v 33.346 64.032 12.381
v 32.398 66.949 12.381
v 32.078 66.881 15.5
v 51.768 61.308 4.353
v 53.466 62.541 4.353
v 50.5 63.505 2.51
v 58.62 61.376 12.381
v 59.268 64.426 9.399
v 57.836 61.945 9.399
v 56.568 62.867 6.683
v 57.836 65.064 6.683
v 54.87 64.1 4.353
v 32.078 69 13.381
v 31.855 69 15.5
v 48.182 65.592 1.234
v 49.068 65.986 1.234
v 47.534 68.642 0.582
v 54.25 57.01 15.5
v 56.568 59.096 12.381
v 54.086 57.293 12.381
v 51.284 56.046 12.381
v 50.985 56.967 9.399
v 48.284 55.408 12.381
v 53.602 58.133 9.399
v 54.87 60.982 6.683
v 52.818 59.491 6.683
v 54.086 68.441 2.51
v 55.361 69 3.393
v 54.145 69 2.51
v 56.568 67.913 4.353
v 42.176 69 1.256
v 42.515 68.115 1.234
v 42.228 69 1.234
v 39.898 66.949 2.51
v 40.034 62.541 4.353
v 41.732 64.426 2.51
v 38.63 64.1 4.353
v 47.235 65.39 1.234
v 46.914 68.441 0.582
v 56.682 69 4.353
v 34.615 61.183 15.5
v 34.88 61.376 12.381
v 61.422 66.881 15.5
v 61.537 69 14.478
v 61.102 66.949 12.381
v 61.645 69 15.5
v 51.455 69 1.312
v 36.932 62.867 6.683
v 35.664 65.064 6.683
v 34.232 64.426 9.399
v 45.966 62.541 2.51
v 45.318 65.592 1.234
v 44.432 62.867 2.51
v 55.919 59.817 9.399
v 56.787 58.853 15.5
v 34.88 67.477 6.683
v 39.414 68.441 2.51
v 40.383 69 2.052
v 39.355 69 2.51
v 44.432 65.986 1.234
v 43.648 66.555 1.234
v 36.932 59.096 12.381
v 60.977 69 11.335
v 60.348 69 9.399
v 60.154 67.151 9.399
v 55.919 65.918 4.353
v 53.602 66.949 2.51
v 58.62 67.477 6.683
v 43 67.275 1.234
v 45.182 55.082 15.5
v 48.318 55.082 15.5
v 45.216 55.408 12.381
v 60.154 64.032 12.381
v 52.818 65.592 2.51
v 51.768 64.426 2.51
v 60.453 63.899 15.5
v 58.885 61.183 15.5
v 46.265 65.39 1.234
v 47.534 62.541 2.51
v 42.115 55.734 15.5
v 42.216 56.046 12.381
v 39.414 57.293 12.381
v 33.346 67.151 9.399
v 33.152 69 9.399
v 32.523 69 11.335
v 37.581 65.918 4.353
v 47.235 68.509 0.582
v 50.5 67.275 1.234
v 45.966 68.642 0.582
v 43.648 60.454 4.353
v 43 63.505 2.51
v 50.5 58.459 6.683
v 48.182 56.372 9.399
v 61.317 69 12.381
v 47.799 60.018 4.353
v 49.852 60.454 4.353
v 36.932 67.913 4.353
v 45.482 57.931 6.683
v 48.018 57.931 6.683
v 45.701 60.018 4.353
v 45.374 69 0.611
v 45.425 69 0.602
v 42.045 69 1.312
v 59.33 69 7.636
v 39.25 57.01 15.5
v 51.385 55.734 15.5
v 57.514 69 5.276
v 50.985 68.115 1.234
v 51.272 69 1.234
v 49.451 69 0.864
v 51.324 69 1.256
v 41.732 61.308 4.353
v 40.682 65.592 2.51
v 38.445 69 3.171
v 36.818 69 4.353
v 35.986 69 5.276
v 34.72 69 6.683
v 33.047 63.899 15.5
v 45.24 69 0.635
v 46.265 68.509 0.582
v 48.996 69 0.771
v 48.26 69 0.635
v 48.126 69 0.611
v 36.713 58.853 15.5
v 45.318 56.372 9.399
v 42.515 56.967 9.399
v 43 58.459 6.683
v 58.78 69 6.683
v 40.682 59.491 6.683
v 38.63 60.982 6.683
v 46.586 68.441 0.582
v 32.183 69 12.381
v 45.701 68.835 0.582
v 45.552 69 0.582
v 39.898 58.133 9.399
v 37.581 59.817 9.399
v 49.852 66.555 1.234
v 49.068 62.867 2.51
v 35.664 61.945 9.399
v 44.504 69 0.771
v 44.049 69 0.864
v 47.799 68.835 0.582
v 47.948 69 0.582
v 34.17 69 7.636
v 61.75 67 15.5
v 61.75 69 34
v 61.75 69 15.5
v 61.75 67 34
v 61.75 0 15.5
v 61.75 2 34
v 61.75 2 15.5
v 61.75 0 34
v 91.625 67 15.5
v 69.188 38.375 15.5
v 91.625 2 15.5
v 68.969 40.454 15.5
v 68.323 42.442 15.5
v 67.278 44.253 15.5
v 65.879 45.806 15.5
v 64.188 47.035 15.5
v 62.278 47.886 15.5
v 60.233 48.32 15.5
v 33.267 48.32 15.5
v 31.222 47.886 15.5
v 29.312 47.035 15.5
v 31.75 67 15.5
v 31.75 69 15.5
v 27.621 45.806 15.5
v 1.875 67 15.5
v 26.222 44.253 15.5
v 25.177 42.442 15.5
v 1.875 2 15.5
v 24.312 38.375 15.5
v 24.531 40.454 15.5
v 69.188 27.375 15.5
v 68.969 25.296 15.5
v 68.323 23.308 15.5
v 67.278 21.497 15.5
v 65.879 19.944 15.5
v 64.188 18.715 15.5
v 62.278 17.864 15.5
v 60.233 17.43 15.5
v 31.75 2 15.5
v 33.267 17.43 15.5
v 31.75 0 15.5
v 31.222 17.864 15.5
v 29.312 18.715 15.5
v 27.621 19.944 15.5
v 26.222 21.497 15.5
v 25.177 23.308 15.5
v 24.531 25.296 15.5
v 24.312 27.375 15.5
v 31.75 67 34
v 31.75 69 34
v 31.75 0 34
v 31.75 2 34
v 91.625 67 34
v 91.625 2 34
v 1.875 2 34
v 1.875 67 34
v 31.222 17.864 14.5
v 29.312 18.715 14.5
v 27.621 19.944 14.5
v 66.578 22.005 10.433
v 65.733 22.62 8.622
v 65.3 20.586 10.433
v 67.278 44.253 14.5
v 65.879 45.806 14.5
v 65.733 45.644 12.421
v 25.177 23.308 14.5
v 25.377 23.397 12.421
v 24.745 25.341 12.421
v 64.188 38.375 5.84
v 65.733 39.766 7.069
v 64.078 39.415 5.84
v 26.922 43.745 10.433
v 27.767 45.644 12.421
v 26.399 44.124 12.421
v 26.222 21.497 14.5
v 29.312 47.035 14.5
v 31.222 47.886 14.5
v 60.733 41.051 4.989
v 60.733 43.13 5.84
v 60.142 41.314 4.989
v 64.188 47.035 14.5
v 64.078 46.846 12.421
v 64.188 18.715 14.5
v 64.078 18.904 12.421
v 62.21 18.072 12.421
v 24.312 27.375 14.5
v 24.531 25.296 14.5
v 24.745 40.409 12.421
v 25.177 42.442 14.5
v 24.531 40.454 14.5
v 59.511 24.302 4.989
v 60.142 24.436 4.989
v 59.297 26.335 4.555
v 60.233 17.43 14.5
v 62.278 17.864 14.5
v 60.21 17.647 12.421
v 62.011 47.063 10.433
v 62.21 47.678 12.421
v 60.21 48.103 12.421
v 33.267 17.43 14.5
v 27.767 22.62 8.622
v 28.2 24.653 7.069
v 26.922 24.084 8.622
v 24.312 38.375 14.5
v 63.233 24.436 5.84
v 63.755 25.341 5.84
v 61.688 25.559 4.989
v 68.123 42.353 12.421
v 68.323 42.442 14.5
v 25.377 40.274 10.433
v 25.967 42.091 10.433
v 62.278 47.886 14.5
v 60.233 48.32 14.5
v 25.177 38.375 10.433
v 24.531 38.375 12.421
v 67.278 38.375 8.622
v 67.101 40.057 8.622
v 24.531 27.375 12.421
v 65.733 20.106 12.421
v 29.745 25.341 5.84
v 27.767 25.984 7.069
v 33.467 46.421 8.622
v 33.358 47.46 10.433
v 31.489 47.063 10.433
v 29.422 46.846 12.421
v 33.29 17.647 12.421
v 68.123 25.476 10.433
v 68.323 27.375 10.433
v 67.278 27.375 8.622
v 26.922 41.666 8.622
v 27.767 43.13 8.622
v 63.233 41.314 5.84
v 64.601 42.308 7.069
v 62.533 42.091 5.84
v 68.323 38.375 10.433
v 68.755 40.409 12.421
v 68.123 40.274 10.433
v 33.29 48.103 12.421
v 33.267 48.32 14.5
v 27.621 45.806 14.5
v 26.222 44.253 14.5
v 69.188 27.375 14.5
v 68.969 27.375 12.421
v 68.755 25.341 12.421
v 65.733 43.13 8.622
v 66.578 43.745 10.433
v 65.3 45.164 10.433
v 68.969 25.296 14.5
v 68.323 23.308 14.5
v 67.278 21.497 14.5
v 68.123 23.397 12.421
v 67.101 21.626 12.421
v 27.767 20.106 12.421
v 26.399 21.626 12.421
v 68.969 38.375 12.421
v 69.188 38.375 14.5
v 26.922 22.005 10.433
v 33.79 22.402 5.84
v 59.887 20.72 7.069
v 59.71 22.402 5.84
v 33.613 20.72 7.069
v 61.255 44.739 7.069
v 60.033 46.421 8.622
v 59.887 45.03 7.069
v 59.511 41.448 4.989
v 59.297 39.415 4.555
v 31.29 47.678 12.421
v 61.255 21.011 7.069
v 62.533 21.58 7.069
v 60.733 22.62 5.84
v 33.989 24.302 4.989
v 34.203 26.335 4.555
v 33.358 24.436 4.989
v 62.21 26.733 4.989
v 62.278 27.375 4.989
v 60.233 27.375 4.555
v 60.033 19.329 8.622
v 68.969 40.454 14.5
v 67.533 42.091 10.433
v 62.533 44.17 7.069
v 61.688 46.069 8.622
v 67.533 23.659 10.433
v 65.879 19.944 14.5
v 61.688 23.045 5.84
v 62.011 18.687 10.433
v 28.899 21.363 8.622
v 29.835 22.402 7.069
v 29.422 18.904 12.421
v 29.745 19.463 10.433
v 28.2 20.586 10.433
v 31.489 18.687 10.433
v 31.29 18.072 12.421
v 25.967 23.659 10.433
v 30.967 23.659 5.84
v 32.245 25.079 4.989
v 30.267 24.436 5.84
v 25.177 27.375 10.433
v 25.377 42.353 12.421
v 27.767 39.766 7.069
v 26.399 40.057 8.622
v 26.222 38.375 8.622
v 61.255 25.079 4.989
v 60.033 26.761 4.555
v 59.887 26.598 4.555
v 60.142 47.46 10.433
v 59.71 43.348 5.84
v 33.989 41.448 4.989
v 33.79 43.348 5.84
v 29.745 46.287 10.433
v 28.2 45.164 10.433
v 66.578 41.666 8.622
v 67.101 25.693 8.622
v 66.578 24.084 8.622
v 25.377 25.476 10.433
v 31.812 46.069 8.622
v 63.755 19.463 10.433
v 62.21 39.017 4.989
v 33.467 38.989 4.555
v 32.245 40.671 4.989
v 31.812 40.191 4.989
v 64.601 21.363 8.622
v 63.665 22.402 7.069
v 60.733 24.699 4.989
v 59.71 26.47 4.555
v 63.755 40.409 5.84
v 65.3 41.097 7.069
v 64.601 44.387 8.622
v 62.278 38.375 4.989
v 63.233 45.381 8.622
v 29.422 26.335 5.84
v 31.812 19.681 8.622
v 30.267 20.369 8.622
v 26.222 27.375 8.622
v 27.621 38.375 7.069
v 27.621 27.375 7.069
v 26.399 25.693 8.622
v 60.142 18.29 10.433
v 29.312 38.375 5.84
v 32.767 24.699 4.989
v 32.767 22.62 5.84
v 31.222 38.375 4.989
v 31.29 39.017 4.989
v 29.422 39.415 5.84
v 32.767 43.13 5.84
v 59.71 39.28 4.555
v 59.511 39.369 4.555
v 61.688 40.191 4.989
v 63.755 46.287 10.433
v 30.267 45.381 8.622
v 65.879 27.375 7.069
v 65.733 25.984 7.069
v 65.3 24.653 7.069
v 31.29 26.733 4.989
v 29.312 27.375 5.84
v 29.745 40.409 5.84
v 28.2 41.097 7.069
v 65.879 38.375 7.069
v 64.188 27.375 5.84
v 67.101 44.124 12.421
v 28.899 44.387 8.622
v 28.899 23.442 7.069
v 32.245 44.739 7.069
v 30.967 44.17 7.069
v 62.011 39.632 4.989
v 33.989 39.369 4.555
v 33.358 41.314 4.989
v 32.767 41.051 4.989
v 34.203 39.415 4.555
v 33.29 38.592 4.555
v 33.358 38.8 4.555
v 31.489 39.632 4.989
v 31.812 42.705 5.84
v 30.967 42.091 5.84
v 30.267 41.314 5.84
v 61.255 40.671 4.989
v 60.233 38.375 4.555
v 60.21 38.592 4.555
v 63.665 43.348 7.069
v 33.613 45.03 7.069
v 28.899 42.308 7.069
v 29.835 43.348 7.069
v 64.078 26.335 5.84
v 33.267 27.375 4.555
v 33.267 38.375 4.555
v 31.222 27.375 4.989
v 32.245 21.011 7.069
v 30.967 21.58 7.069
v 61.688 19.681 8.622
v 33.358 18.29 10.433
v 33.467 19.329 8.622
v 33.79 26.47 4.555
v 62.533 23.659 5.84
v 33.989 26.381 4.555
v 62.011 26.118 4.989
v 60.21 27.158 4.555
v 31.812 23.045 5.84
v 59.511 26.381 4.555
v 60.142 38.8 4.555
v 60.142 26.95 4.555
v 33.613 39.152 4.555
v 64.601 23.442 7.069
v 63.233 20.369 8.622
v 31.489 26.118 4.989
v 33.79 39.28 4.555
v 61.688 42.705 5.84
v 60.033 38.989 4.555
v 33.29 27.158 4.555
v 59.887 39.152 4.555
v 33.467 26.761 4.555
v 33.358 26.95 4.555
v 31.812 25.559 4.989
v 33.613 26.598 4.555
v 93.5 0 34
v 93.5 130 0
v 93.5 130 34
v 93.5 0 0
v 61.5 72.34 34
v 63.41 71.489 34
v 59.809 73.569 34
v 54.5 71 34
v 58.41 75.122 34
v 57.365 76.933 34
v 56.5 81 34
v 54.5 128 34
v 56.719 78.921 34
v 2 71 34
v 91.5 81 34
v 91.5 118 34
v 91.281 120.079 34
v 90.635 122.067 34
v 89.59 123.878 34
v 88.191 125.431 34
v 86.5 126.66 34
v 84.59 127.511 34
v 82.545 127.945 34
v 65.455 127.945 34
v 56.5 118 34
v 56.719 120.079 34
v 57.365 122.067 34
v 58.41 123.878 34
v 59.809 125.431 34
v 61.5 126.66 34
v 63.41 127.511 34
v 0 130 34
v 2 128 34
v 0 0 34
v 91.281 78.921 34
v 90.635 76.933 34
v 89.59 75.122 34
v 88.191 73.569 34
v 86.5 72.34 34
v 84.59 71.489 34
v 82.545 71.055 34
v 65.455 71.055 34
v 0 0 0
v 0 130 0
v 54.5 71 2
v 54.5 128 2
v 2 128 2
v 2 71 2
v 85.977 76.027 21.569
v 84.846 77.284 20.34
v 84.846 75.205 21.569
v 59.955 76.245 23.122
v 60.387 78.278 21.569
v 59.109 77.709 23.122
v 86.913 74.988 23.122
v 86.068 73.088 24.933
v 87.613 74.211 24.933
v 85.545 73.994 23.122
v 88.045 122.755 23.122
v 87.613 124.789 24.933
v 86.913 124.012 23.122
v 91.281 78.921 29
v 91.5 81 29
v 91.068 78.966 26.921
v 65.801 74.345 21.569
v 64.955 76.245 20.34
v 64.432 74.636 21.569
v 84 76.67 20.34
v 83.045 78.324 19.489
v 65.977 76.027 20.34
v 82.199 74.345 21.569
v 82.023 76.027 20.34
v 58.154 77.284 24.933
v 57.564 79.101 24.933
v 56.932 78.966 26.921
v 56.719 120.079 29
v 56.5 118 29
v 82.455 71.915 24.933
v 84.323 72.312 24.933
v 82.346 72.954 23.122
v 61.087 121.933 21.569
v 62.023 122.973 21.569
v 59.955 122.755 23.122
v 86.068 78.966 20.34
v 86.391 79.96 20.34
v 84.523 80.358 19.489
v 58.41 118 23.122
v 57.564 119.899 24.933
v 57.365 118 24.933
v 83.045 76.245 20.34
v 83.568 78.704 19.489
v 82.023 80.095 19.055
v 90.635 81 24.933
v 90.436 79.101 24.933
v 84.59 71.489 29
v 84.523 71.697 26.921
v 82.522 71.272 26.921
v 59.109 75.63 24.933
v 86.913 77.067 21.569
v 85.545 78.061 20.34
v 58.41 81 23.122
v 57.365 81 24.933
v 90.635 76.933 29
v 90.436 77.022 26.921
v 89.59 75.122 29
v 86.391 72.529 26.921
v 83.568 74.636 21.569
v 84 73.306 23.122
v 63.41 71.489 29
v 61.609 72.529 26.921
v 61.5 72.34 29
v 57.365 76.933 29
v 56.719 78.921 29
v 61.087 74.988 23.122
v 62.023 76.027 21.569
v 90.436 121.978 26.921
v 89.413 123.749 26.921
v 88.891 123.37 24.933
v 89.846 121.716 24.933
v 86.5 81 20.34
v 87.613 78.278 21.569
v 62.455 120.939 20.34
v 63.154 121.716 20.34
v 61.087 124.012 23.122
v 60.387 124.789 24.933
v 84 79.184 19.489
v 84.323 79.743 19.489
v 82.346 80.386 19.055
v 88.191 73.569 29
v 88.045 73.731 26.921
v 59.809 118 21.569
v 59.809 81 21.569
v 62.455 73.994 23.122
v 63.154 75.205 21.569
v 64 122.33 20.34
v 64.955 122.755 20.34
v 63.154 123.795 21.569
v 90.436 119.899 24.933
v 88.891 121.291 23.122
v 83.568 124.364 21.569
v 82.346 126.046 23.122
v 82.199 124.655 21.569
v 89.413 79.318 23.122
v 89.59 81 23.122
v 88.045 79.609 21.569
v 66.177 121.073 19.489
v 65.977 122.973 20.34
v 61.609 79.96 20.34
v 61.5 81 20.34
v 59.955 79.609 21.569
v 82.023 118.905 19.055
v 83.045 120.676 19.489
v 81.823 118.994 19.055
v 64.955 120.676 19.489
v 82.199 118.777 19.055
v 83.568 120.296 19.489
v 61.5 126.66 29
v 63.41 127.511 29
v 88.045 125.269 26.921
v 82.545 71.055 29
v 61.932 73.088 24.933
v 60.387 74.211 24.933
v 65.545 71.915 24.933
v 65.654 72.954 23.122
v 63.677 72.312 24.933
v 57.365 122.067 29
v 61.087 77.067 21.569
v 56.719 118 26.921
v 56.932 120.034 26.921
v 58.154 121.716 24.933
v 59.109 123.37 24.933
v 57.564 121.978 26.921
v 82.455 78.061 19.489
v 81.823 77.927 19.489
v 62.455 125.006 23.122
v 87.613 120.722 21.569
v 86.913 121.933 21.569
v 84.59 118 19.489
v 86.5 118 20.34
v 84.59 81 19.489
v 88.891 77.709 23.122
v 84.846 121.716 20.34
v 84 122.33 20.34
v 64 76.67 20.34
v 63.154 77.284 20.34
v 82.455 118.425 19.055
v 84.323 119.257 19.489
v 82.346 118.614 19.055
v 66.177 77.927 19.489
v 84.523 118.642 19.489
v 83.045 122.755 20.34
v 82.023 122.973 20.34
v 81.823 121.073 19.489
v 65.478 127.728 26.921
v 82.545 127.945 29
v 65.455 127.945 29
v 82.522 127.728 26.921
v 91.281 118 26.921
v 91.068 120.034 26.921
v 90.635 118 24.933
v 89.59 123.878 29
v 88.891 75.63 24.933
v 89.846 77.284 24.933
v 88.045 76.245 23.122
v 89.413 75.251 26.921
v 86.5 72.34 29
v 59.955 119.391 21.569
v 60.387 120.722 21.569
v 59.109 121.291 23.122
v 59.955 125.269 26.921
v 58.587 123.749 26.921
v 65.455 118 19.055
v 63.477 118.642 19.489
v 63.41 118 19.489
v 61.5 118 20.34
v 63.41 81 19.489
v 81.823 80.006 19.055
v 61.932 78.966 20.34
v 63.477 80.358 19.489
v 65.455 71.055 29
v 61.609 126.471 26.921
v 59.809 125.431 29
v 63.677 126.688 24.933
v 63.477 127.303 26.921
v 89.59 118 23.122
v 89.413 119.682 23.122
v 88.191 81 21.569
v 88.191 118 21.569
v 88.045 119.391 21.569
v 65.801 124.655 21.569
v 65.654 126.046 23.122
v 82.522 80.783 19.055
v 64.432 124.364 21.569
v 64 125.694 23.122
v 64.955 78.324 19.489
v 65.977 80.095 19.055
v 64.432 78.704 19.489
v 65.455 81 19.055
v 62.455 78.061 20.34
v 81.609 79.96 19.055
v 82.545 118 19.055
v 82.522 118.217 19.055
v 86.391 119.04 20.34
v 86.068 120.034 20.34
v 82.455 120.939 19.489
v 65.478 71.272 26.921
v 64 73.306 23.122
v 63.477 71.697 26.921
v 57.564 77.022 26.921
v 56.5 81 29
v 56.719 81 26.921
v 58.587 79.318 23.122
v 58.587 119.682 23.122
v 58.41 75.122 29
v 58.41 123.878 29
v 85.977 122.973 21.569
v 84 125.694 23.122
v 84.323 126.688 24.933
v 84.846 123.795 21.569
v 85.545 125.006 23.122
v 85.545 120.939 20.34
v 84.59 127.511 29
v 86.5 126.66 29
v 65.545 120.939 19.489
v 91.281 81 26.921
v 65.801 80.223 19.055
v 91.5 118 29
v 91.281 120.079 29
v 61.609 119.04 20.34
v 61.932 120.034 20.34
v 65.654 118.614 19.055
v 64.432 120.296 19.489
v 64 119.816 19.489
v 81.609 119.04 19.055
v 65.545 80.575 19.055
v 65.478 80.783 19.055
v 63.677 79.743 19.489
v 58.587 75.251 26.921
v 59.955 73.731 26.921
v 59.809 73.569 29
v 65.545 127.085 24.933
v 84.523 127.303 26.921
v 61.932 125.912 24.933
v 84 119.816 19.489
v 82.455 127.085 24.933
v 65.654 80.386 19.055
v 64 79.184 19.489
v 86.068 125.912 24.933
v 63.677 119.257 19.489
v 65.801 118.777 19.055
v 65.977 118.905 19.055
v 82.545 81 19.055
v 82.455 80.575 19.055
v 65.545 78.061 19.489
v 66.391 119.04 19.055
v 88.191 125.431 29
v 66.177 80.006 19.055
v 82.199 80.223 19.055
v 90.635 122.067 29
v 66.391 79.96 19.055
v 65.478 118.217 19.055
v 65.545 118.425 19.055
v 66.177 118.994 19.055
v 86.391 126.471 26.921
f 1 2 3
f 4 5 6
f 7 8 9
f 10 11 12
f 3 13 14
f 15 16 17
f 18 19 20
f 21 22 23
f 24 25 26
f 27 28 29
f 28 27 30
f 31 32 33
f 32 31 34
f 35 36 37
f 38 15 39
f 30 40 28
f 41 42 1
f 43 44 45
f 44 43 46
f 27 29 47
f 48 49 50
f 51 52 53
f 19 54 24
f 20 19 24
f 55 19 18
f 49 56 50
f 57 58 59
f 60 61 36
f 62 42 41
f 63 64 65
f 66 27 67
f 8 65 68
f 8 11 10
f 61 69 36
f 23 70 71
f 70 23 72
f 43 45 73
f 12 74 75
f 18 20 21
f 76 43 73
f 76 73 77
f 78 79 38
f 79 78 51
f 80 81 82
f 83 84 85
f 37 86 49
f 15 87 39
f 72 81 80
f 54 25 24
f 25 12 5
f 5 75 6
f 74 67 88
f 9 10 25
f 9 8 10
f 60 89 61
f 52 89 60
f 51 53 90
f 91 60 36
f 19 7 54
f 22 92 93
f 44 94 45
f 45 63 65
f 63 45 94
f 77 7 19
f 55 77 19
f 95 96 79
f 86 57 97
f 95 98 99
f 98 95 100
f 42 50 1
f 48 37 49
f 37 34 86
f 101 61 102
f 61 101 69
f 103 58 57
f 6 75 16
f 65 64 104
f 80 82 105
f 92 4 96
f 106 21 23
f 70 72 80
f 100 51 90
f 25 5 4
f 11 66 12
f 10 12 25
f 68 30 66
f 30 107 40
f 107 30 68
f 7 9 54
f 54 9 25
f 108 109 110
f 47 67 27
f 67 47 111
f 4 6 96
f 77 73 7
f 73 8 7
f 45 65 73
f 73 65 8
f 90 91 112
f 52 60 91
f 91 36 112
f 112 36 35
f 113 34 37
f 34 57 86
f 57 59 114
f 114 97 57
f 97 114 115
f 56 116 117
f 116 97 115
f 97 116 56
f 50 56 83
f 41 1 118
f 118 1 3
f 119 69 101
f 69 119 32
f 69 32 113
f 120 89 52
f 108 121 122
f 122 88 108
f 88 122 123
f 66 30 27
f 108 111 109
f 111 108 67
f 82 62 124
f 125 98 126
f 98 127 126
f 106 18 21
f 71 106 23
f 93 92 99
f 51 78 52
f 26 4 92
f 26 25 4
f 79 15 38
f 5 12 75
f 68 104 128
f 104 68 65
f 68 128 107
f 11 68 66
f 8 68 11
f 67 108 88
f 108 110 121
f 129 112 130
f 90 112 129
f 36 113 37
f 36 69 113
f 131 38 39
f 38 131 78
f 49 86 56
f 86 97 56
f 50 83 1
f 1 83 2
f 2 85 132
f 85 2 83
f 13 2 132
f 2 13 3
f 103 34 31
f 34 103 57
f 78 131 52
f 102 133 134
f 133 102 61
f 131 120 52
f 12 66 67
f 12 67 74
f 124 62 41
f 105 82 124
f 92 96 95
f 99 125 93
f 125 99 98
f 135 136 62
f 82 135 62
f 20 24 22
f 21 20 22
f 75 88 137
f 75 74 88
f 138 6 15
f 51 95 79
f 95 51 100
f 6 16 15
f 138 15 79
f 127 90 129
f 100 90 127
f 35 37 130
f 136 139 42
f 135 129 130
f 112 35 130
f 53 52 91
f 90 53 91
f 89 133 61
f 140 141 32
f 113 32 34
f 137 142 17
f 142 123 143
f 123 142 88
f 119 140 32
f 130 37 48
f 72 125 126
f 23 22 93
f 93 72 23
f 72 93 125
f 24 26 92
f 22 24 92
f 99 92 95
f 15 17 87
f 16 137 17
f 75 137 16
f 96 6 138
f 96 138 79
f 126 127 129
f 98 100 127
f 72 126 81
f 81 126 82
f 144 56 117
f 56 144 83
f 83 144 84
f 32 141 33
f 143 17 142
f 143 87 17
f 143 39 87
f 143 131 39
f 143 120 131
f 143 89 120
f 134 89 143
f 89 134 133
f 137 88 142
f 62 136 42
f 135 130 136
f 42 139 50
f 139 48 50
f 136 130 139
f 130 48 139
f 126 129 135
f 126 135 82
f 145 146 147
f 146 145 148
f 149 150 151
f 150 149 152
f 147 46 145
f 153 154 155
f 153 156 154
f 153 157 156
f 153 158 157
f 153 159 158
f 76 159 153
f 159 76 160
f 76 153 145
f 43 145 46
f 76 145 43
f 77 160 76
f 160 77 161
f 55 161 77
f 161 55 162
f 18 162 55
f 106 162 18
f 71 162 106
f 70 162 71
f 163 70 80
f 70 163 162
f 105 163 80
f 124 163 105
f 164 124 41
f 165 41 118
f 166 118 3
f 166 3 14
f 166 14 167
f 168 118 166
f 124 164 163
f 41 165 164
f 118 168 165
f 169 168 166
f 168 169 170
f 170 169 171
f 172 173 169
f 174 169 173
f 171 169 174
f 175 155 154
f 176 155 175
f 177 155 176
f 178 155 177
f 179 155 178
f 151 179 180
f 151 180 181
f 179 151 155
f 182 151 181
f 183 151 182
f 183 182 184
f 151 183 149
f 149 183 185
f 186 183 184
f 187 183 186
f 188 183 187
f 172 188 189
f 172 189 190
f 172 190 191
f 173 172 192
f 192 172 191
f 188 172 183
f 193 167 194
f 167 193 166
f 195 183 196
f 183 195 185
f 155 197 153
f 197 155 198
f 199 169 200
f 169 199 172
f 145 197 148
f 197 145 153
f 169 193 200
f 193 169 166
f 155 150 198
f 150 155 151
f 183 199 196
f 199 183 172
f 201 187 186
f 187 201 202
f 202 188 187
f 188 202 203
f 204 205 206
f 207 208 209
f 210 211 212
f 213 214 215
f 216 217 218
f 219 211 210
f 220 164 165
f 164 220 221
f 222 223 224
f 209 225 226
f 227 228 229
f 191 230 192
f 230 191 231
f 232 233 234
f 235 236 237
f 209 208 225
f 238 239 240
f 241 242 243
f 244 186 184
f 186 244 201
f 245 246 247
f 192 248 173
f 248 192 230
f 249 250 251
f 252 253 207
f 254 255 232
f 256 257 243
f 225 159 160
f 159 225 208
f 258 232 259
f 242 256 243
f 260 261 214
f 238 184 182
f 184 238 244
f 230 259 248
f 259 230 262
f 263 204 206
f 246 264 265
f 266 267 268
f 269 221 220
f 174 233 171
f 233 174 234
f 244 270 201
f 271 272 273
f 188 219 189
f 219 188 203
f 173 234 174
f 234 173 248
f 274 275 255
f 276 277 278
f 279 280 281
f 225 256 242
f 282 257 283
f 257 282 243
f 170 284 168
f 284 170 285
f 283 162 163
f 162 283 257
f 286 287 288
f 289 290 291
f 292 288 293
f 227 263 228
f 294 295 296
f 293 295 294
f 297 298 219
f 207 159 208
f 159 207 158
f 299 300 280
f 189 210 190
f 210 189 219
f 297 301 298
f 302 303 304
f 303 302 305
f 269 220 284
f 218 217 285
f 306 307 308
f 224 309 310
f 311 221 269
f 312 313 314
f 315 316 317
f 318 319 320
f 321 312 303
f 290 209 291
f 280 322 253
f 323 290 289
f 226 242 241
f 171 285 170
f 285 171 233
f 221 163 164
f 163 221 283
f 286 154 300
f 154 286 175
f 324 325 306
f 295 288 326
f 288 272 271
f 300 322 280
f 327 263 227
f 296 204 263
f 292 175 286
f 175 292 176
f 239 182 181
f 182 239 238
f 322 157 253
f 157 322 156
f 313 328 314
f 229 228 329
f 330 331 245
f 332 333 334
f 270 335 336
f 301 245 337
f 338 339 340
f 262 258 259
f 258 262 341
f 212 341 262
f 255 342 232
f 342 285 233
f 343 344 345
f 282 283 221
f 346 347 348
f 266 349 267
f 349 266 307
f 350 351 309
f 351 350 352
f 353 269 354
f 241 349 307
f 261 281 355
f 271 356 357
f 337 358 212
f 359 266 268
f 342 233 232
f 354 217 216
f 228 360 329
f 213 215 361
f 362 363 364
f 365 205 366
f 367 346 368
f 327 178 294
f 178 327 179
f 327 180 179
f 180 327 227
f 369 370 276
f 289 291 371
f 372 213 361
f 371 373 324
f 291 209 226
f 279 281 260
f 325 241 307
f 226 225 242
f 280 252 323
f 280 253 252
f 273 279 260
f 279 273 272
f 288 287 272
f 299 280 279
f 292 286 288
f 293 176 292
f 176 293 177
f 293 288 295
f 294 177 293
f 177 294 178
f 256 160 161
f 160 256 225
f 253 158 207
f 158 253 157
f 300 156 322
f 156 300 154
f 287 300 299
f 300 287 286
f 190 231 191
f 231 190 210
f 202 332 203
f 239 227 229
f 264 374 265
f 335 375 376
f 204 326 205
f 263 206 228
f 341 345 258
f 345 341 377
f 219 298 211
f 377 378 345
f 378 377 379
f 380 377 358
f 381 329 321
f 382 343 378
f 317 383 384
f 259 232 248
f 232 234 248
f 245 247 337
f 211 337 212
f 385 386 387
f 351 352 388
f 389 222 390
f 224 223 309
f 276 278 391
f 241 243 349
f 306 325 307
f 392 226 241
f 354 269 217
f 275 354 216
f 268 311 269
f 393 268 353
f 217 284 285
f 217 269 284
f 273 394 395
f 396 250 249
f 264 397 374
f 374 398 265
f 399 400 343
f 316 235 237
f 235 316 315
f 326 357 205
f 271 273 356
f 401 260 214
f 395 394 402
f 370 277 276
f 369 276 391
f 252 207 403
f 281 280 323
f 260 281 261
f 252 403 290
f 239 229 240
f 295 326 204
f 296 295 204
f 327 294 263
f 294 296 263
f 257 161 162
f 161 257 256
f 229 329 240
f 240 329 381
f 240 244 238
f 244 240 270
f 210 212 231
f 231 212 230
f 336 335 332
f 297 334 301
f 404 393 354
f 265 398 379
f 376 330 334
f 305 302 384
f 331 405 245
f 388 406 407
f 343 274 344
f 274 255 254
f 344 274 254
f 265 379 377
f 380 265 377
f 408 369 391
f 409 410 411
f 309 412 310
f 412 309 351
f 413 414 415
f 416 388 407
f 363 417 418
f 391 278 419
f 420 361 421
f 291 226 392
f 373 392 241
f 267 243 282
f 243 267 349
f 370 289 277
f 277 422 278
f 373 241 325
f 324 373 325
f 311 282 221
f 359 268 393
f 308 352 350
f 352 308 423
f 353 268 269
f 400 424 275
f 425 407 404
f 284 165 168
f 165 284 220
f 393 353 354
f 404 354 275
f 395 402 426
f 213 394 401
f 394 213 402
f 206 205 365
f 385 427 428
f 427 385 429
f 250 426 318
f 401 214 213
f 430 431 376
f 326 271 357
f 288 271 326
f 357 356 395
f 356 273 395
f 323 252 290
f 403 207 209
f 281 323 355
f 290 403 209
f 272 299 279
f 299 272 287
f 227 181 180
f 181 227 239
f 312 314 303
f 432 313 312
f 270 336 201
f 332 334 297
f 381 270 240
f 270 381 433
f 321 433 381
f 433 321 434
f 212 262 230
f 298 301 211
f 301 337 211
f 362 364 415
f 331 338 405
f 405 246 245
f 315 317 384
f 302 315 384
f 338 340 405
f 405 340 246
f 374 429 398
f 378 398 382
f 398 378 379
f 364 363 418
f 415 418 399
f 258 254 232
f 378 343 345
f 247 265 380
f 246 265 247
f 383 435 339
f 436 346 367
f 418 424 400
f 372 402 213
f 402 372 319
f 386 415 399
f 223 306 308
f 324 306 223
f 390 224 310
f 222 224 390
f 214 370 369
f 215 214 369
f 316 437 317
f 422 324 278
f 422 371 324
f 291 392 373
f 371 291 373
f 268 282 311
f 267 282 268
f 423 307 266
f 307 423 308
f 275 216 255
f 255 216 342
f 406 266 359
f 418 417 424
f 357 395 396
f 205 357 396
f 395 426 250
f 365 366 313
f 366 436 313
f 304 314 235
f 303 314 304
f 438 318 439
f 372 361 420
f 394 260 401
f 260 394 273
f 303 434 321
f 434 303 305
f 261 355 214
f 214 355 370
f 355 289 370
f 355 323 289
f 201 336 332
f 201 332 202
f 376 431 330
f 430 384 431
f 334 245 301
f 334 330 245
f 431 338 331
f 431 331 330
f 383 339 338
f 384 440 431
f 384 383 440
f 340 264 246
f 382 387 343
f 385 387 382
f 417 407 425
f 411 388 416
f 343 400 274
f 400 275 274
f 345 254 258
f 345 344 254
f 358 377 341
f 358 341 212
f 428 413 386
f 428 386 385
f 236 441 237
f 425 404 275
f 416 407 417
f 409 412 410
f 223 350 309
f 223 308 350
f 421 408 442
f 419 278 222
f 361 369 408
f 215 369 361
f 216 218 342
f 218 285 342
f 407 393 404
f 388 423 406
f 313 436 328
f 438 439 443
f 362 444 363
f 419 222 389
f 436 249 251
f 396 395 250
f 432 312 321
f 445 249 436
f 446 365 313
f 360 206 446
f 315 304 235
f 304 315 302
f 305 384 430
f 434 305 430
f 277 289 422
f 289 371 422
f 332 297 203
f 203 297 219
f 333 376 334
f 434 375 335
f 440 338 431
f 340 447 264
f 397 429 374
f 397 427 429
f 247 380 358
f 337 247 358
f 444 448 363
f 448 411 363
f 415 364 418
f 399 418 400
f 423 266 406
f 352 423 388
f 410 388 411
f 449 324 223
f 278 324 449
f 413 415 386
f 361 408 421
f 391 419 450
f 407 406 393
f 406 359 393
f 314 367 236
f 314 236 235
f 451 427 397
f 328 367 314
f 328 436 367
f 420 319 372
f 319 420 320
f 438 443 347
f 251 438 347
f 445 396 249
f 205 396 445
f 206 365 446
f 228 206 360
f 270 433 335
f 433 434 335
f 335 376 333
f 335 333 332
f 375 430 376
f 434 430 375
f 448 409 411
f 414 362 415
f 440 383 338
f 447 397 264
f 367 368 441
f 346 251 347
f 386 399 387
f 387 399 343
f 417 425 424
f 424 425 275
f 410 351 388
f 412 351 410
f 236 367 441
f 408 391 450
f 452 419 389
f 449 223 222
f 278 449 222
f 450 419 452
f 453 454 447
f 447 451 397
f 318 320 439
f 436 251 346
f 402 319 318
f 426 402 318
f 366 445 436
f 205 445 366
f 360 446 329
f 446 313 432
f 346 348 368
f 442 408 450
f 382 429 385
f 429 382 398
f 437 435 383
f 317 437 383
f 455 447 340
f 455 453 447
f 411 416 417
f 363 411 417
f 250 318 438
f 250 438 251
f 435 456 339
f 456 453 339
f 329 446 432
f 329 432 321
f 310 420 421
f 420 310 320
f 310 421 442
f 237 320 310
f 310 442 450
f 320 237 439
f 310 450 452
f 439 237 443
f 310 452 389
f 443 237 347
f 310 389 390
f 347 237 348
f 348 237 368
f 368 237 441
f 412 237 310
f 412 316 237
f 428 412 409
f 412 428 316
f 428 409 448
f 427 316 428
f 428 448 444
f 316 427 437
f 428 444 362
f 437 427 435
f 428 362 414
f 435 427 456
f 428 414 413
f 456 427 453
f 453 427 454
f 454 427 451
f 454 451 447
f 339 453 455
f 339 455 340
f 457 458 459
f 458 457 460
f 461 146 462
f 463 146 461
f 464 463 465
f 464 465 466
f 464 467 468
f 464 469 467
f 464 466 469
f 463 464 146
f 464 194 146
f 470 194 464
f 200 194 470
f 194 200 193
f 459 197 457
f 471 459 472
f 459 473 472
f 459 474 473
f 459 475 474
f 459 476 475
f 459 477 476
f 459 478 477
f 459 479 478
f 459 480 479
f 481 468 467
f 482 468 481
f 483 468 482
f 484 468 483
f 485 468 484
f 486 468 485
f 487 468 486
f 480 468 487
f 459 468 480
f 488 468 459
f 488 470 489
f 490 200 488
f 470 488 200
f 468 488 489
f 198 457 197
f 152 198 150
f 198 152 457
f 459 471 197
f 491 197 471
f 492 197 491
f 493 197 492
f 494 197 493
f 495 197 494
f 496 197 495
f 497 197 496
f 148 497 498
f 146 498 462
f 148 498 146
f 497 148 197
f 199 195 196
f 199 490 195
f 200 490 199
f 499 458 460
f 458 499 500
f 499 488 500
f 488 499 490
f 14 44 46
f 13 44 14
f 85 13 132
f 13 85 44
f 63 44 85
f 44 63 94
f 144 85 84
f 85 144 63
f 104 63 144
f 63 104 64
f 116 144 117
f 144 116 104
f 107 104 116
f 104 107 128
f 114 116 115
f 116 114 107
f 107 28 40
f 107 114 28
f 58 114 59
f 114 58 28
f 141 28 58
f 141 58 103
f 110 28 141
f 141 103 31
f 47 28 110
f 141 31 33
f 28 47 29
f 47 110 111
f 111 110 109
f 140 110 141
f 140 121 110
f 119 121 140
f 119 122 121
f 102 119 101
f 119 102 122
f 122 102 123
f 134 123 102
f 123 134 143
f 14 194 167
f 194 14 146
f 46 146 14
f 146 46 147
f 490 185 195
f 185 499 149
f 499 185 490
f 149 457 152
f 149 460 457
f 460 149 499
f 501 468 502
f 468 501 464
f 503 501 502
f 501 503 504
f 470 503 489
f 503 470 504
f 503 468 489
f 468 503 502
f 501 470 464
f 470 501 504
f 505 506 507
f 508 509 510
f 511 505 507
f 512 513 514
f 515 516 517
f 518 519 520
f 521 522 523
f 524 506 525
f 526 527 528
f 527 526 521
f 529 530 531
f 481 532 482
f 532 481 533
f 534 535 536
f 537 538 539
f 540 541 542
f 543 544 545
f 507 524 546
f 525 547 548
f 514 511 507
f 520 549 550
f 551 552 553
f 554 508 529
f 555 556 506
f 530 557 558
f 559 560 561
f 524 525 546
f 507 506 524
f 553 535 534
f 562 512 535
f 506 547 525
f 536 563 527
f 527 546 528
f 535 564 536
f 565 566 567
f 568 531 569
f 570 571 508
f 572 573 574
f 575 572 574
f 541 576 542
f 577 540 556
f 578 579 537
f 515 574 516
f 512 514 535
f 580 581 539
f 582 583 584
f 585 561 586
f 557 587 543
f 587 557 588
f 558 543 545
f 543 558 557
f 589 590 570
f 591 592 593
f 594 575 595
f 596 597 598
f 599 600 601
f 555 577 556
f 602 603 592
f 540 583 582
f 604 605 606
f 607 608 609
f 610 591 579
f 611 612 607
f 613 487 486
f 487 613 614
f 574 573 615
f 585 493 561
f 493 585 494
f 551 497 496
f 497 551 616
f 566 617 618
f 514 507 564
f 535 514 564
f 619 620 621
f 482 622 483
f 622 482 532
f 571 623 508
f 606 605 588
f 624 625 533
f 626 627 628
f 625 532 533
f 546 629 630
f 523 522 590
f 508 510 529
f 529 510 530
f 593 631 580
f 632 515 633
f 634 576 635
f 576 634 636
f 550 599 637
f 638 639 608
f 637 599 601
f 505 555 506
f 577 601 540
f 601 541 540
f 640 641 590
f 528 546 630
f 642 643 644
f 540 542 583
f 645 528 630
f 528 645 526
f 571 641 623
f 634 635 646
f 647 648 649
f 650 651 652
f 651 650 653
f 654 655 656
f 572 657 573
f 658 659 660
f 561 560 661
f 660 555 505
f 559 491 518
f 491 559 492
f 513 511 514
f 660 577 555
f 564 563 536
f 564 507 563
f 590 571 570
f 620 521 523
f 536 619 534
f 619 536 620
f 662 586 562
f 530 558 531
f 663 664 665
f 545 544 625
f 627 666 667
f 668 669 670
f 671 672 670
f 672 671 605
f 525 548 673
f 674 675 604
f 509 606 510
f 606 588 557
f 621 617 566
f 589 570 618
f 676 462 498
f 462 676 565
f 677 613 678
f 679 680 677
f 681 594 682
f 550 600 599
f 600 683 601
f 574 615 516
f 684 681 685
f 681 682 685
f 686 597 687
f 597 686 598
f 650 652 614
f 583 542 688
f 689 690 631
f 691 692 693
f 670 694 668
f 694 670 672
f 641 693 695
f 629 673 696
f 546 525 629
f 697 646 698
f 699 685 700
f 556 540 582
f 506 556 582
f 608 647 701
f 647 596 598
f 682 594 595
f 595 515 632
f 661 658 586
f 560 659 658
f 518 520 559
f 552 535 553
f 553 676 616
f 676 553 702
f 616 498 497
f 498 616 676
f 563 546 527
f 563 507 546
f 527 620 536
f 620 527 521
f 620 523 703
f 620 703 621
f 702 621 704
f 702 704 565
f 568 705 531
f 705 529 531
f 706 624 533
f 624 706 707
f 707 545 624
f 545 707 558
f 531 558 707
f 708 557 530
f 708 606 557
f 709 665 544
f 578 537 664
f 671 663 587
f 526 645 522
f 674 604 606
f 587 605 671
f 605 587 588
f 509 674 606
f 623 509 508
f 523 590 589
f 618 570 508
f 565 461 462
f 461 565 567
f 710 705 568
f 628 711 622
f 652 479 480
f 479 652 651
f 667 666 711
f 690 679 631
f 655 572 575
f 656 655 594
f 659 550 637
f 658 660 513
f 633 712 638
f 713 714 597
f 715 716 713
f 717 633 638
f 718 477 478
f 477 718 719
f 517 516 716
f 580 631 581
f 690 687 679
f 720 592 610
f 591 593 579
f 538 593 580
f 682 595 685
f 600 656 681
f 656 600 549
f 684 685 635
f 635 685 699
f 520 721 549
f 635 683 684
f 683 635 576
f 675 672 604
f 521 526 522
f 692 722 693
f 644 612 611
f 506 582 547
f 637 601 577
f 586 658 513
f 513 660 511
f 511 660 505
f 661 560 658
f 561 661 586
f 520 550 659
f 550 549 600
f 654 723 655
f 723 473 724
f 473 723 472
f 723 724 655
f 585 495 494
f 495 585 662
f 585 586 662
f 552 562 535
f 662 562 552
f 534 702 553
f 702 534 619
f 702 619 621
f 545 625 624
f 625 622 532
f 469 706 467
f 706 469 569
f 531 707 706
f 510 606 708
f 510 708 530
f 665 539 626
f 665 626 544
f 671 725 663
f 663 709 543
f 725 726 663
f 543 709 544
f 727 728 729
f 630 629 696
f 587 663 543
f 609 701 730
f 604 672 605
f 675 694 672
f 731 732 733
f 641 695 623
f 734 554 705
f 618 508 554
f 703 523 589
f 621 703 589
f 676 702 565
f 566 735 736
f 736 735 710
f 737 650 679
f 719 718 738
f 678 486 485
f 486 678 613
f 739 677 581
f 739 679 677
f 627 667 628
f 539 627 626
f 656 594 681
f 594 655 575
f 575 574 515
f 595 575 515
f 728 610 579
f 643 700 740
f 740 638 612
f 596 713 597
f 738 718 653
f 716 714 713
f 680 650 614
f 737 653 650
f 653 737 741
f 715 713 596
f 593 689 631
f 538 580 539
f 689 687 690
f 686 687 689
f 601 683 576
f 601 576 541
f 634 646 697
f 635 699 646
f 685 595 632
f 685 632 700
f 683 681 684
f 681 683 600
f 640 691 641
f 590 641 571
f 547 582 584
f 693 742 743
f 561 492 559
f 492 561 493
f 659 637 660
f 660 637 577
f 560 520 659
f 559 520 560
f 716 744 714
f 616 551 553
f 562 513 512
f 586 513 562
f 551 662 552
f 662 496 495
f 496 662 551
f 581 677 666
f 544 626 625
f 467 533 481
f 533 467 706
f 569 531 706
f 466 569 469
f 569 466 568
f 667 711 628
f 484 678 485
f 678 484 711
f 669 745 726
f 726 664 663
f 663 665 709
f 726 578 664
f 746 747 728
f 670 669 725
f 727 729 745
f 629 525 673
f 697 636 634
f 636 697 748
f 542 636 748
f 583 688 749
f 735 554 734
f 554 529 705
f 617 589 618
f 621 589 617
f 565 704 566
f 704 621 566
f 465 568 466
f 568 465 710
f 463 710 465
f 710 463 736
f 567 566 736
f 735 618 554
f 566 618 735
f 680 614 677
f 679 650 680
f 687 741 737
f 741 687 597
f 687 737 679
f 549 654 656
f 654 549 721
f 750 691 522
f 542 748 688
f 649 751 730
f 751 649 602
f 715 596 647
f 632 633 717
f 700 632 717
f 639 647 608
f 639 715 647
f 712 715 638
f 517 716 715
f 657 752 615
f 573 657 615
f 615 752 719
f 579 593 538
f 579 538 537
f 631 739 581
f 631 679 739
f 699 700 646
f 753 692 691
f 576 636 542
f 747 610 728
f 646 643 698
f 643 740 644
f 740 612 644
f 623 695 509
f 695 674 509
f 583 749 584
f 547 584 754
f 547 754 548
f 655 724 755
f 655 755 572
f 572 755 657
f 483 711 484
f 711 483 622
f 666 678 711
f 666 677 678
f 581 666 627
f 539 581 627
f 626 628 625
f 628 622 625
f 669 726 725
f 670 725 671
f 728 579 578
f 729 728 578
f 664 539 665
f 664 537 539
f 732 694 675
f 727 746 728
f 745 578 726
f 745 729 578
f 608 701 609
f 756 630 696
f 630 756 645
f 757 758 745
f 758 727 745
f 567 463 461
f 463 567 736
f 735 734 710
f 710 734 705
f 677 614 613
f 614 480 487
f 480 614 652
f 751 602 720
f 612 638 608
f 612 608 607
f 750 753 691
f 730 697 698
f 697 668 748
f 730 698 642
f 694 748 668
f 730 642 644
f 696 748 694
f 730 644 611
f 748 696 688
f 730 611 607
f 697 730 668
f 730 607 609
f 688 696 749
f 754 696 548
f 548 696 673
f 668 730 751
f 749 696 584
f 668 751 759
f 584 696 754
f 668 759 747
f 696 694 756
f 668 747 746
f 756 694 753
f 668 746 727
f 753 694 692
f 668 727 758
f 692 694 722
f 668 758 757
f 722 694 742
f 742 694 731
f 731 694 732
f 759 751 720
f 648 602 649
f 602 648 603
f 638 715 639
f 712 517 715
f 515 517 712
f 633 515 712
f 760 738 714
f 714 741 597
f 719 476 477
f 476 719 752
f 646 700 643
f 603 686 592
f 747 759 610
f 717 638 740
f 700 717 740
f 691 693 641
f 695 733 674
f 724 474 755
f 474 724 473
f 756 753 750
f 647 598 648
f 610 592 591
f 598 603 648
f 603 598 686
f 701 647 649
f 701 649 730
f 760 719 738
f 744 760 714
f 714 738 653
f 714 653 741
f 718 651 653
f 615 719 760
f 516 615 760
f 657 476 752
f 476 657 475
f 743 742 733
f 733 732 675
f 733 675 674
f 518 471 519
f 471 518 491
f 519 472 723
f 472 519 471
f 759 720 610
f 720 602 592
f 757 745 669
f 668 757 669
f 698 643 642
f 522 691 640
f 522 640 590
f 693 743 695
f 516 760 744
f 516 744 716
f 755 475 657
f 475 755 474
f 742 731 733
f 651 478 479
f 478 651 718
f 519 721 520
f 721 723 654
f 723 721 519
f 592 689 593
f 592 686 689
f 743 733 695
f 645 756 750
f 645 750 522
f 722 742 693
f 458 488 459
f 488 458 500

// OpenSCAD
// file: ../roundedcube.scad
// Aquired from https://danielupshaw.com/openscad-rounded-corners/
// License unknown

// Higher definition curves
$fs = 0.01;

module roundedcube(size = [1, 1, 1], center = false, radius = 0.5, apply_to = "all") {
	// If single value, convert to [x, y, z] vector
	size = (size[0] == undef) ? [size, size, size] : size;

	translate_min = radius;
	translate_xmax = size[0] - radius;
	translate_ymax = size[1] - radius;
	translate_zmax = size[2] - radius;

	diameter = radius * 2;

	module build_point(type = "sphere", rotate = [0, 0, 0]) {
		if (type == "sphere") {
			sphere(r = radius);
		} else if (type == "cylinder") {
			rotate(a = rotate)
			cylinder(h = diameter, r = radius, center = true);
		}
	}

	obj_translate = (center == false) ?
		[0, 0, 0] : [
			-(size[0] / 2),
			-(size[1] / 2),
			-(size[2] / 2)
		];

	translate(v = obj_translate) {
		hull() {
			for (translate_x = [translate_min, translate_xmax]) {
				x_at = (translate_x == translate_min) ? "min" : "max";
				for (translate_y = [translate_min, translate_ymax]) {
					y_at = (translate_y == translate_min) ? "min" : "max";
					for (translate_z = [translate_min, translate_zmax]) {
						z_at = (translate_z == translate_min) ? "min" : "max";

						translate(v = [translate_x, translate_y, translate_z])
						if (
							(apply_to == "all") ||
							(apply_to == "xmin" && x_at == "min") || (apply_to == "xmax" && x_at == "max") ||
							(apply_to == "ymin" && y_at == "min") || (apply_to == "ymax" && y_at == "max") ||
							(apply_to == "zmin" && z_at == "min") || (apply_to == "zmax" && z_at == "max")
						) {
							build_point("sphere");
						} else {
							rotate =
								(apply_to == "xmin" || apply_to == "xmax" || apply_to == "x") ? [0, 90, 0] : (
								(apply_to == "ymin" || apply_to == "ymax" || apply_to == "y") ? [90, 90, 0] :
								[0, 0, 0]
							);
							build_point("cylinder", rotate);
						}
					}
				}
			}
		}
	}
}
// file: ../parts.scad
/*This is a module for openscad to be able to output multiple parts
It pairs with a python script that actually managed the multi-output.

https://traverseda.github.io/code/partsScad/index.html
*/
multiPartOutput = false;
multiPartFirstRun = false;
multiPartBuildMode = "default";

module part(partName, c = undef, buildmode="default") {
	if (multiPartFirstRun) {
		echo("Defined new part ---", partName);
		echo("Color ---", partName, c);
	}

	if (buildmode==multiPartBuildMode) {
		if (!multiPartOutput) {
			color(c=c)children();
		}

		if (multiPartOutput == partName) {
			color(c=c)children();
		}
	}
}
// main file
use <../parts.scad>
use <../roundedcube.scad>

THUMB_WIDTH = 30;
WALL_WIDTH = 2;

BOX_HEIGHT = 43.5;
BOX_WIDTH = 93.5;
BOX_DEPTH = 130;

CARD_HEIGHT = 19.5;
CARD_WIDTH = 89.75;
CARD_DEPTH = 65;

POTION_HEIGHT = 20;
POTION_WIDTH = CARD_WIDTH / 2;
POTION_DEPTH = CARD_DEPTH - THUMB_WIDTH - WALL_WIDTH * 2;

DICE_HEIGHT = 30;

DAMAGE_HEIGHT = 15;
DAMAGE_WIDTH = 35;

BOOK_HEIGHT = 9.5;

render_helper = 1; // Helps the quick render not have a "skin" on top of the hole
token_hole_radius = 10;

working_height = BOX_HEIGHT - BOOK_HEIGHT;
card_holder_depth = CARD_DEPTH + WALL_WIDTH * 2;
card_holder_width_offset = (BOX_WIDTH - CARD_WIDTH) / 2;
part_holder_depth = BOX_DEPTH - card_holder_depth;
part_holder_height = working_height;

module card_holder_body() {
    cube([BOX_WIDTH, card_holder_depth, working_height]);
}

module card_holder_slot() {
    offset_x = card_holder_width_offset;
    offset_y = WALL_WIDTH;
    offset_z = working_height - CARD_HEIGHT + render_helper;
    
    translate([offset_x, offset_y, offset_z])
    cube([CARD_WIDTH, CARD_DEPTH, CARD_HEIGHT + render_helper]);
}

module card_holder_thumb() {
    offset_x = (BOX_WIDTH - THUMB_WIDTH) / 2;
    offset_y = -render_helper;
    offset_z = working_height - CARD_HEIGHT + render_helper;
    depth = card_holder_depth + render_helper * 2;

    translate([offset_x, offset_y, offset_z])
    union() {
        translate([THUMB_WIDTH / 2, depth, 0])
        sphere(d = THUMB_WIDTH);
        cube([THUMB_WIDTH, depth, CARD_HEIGHT + render_helper]);
    }
}

module potion_token() {
    offset_x = (BOX_WIDTH - POTION_WIDTH) / 2;
    offset_y = card_holder_width_offset + POTION_DEPTH / 2;
    offset_z = working_height - POTION_HEIGHT + token_hole_radius - CARD_HEIGHT;
    
    translate([offset_x, offset_y, offset_z])
    roundedcube(
        [POTION_WIDTH, POTION_DEPTH, POTION_HEIGHT + token_hole_radius],
        radius = token_hole_radius
    );
}

module card_holder() {
    difference() {
        card_holder_body();
        union() {
            card_holder_slot();
            card_holder_thumb();
            potion_token();
        }
    }
}

module part_holder_body() {
    cube([BOX_WIDTH, part_holder_depth, part_holder_height]);
}

module dice() {
    width = BOX_WIDTH - WALL_WIDTH * 3 - DAMAGE_WIDTH;
    depth = part_holder_depth - WALL_WIDTH * 2;
    height = part_holder_height - WALL_WIDTH + render_helper;
    
    translate([WALL_WIDTH, WALL_WIDTH, WALL_WIDTH])
    cube([width, depth, height]);
}

module damage_tokens() {
    offset_x = BOX_WIDTH - WALL_WIDTH - DAMAGE_WIDTH;
    offset_y = WALL_WIDTH;
    offset_z = part_holder_height - DAMAGE_HEIGHT;
    
    depth = part_holder_depth - WALL_WIDTH * 2;
    
    translate([offset_x, offset_y, offset_z])
    roundedcube(
        [DAMAGE_WIDTH, depth, DAMAGE_HEIGHT + token_hole_radius],
        radius = token_hole_radius
    );
}

module part_holder() {
    difference() {
        part_holder_body();
        union() {
            dice();
            damage_tokens();
        }
    }
}

part("card_holder.stl", c = "red") {
    card_holder();
}

part_holder_offset_z = working_height - part_holder_height;

translate([0, card_holder_depth, part_holder_offset_z])
part("part_holder.stl", c = "blue") {
    part_holder();
}
